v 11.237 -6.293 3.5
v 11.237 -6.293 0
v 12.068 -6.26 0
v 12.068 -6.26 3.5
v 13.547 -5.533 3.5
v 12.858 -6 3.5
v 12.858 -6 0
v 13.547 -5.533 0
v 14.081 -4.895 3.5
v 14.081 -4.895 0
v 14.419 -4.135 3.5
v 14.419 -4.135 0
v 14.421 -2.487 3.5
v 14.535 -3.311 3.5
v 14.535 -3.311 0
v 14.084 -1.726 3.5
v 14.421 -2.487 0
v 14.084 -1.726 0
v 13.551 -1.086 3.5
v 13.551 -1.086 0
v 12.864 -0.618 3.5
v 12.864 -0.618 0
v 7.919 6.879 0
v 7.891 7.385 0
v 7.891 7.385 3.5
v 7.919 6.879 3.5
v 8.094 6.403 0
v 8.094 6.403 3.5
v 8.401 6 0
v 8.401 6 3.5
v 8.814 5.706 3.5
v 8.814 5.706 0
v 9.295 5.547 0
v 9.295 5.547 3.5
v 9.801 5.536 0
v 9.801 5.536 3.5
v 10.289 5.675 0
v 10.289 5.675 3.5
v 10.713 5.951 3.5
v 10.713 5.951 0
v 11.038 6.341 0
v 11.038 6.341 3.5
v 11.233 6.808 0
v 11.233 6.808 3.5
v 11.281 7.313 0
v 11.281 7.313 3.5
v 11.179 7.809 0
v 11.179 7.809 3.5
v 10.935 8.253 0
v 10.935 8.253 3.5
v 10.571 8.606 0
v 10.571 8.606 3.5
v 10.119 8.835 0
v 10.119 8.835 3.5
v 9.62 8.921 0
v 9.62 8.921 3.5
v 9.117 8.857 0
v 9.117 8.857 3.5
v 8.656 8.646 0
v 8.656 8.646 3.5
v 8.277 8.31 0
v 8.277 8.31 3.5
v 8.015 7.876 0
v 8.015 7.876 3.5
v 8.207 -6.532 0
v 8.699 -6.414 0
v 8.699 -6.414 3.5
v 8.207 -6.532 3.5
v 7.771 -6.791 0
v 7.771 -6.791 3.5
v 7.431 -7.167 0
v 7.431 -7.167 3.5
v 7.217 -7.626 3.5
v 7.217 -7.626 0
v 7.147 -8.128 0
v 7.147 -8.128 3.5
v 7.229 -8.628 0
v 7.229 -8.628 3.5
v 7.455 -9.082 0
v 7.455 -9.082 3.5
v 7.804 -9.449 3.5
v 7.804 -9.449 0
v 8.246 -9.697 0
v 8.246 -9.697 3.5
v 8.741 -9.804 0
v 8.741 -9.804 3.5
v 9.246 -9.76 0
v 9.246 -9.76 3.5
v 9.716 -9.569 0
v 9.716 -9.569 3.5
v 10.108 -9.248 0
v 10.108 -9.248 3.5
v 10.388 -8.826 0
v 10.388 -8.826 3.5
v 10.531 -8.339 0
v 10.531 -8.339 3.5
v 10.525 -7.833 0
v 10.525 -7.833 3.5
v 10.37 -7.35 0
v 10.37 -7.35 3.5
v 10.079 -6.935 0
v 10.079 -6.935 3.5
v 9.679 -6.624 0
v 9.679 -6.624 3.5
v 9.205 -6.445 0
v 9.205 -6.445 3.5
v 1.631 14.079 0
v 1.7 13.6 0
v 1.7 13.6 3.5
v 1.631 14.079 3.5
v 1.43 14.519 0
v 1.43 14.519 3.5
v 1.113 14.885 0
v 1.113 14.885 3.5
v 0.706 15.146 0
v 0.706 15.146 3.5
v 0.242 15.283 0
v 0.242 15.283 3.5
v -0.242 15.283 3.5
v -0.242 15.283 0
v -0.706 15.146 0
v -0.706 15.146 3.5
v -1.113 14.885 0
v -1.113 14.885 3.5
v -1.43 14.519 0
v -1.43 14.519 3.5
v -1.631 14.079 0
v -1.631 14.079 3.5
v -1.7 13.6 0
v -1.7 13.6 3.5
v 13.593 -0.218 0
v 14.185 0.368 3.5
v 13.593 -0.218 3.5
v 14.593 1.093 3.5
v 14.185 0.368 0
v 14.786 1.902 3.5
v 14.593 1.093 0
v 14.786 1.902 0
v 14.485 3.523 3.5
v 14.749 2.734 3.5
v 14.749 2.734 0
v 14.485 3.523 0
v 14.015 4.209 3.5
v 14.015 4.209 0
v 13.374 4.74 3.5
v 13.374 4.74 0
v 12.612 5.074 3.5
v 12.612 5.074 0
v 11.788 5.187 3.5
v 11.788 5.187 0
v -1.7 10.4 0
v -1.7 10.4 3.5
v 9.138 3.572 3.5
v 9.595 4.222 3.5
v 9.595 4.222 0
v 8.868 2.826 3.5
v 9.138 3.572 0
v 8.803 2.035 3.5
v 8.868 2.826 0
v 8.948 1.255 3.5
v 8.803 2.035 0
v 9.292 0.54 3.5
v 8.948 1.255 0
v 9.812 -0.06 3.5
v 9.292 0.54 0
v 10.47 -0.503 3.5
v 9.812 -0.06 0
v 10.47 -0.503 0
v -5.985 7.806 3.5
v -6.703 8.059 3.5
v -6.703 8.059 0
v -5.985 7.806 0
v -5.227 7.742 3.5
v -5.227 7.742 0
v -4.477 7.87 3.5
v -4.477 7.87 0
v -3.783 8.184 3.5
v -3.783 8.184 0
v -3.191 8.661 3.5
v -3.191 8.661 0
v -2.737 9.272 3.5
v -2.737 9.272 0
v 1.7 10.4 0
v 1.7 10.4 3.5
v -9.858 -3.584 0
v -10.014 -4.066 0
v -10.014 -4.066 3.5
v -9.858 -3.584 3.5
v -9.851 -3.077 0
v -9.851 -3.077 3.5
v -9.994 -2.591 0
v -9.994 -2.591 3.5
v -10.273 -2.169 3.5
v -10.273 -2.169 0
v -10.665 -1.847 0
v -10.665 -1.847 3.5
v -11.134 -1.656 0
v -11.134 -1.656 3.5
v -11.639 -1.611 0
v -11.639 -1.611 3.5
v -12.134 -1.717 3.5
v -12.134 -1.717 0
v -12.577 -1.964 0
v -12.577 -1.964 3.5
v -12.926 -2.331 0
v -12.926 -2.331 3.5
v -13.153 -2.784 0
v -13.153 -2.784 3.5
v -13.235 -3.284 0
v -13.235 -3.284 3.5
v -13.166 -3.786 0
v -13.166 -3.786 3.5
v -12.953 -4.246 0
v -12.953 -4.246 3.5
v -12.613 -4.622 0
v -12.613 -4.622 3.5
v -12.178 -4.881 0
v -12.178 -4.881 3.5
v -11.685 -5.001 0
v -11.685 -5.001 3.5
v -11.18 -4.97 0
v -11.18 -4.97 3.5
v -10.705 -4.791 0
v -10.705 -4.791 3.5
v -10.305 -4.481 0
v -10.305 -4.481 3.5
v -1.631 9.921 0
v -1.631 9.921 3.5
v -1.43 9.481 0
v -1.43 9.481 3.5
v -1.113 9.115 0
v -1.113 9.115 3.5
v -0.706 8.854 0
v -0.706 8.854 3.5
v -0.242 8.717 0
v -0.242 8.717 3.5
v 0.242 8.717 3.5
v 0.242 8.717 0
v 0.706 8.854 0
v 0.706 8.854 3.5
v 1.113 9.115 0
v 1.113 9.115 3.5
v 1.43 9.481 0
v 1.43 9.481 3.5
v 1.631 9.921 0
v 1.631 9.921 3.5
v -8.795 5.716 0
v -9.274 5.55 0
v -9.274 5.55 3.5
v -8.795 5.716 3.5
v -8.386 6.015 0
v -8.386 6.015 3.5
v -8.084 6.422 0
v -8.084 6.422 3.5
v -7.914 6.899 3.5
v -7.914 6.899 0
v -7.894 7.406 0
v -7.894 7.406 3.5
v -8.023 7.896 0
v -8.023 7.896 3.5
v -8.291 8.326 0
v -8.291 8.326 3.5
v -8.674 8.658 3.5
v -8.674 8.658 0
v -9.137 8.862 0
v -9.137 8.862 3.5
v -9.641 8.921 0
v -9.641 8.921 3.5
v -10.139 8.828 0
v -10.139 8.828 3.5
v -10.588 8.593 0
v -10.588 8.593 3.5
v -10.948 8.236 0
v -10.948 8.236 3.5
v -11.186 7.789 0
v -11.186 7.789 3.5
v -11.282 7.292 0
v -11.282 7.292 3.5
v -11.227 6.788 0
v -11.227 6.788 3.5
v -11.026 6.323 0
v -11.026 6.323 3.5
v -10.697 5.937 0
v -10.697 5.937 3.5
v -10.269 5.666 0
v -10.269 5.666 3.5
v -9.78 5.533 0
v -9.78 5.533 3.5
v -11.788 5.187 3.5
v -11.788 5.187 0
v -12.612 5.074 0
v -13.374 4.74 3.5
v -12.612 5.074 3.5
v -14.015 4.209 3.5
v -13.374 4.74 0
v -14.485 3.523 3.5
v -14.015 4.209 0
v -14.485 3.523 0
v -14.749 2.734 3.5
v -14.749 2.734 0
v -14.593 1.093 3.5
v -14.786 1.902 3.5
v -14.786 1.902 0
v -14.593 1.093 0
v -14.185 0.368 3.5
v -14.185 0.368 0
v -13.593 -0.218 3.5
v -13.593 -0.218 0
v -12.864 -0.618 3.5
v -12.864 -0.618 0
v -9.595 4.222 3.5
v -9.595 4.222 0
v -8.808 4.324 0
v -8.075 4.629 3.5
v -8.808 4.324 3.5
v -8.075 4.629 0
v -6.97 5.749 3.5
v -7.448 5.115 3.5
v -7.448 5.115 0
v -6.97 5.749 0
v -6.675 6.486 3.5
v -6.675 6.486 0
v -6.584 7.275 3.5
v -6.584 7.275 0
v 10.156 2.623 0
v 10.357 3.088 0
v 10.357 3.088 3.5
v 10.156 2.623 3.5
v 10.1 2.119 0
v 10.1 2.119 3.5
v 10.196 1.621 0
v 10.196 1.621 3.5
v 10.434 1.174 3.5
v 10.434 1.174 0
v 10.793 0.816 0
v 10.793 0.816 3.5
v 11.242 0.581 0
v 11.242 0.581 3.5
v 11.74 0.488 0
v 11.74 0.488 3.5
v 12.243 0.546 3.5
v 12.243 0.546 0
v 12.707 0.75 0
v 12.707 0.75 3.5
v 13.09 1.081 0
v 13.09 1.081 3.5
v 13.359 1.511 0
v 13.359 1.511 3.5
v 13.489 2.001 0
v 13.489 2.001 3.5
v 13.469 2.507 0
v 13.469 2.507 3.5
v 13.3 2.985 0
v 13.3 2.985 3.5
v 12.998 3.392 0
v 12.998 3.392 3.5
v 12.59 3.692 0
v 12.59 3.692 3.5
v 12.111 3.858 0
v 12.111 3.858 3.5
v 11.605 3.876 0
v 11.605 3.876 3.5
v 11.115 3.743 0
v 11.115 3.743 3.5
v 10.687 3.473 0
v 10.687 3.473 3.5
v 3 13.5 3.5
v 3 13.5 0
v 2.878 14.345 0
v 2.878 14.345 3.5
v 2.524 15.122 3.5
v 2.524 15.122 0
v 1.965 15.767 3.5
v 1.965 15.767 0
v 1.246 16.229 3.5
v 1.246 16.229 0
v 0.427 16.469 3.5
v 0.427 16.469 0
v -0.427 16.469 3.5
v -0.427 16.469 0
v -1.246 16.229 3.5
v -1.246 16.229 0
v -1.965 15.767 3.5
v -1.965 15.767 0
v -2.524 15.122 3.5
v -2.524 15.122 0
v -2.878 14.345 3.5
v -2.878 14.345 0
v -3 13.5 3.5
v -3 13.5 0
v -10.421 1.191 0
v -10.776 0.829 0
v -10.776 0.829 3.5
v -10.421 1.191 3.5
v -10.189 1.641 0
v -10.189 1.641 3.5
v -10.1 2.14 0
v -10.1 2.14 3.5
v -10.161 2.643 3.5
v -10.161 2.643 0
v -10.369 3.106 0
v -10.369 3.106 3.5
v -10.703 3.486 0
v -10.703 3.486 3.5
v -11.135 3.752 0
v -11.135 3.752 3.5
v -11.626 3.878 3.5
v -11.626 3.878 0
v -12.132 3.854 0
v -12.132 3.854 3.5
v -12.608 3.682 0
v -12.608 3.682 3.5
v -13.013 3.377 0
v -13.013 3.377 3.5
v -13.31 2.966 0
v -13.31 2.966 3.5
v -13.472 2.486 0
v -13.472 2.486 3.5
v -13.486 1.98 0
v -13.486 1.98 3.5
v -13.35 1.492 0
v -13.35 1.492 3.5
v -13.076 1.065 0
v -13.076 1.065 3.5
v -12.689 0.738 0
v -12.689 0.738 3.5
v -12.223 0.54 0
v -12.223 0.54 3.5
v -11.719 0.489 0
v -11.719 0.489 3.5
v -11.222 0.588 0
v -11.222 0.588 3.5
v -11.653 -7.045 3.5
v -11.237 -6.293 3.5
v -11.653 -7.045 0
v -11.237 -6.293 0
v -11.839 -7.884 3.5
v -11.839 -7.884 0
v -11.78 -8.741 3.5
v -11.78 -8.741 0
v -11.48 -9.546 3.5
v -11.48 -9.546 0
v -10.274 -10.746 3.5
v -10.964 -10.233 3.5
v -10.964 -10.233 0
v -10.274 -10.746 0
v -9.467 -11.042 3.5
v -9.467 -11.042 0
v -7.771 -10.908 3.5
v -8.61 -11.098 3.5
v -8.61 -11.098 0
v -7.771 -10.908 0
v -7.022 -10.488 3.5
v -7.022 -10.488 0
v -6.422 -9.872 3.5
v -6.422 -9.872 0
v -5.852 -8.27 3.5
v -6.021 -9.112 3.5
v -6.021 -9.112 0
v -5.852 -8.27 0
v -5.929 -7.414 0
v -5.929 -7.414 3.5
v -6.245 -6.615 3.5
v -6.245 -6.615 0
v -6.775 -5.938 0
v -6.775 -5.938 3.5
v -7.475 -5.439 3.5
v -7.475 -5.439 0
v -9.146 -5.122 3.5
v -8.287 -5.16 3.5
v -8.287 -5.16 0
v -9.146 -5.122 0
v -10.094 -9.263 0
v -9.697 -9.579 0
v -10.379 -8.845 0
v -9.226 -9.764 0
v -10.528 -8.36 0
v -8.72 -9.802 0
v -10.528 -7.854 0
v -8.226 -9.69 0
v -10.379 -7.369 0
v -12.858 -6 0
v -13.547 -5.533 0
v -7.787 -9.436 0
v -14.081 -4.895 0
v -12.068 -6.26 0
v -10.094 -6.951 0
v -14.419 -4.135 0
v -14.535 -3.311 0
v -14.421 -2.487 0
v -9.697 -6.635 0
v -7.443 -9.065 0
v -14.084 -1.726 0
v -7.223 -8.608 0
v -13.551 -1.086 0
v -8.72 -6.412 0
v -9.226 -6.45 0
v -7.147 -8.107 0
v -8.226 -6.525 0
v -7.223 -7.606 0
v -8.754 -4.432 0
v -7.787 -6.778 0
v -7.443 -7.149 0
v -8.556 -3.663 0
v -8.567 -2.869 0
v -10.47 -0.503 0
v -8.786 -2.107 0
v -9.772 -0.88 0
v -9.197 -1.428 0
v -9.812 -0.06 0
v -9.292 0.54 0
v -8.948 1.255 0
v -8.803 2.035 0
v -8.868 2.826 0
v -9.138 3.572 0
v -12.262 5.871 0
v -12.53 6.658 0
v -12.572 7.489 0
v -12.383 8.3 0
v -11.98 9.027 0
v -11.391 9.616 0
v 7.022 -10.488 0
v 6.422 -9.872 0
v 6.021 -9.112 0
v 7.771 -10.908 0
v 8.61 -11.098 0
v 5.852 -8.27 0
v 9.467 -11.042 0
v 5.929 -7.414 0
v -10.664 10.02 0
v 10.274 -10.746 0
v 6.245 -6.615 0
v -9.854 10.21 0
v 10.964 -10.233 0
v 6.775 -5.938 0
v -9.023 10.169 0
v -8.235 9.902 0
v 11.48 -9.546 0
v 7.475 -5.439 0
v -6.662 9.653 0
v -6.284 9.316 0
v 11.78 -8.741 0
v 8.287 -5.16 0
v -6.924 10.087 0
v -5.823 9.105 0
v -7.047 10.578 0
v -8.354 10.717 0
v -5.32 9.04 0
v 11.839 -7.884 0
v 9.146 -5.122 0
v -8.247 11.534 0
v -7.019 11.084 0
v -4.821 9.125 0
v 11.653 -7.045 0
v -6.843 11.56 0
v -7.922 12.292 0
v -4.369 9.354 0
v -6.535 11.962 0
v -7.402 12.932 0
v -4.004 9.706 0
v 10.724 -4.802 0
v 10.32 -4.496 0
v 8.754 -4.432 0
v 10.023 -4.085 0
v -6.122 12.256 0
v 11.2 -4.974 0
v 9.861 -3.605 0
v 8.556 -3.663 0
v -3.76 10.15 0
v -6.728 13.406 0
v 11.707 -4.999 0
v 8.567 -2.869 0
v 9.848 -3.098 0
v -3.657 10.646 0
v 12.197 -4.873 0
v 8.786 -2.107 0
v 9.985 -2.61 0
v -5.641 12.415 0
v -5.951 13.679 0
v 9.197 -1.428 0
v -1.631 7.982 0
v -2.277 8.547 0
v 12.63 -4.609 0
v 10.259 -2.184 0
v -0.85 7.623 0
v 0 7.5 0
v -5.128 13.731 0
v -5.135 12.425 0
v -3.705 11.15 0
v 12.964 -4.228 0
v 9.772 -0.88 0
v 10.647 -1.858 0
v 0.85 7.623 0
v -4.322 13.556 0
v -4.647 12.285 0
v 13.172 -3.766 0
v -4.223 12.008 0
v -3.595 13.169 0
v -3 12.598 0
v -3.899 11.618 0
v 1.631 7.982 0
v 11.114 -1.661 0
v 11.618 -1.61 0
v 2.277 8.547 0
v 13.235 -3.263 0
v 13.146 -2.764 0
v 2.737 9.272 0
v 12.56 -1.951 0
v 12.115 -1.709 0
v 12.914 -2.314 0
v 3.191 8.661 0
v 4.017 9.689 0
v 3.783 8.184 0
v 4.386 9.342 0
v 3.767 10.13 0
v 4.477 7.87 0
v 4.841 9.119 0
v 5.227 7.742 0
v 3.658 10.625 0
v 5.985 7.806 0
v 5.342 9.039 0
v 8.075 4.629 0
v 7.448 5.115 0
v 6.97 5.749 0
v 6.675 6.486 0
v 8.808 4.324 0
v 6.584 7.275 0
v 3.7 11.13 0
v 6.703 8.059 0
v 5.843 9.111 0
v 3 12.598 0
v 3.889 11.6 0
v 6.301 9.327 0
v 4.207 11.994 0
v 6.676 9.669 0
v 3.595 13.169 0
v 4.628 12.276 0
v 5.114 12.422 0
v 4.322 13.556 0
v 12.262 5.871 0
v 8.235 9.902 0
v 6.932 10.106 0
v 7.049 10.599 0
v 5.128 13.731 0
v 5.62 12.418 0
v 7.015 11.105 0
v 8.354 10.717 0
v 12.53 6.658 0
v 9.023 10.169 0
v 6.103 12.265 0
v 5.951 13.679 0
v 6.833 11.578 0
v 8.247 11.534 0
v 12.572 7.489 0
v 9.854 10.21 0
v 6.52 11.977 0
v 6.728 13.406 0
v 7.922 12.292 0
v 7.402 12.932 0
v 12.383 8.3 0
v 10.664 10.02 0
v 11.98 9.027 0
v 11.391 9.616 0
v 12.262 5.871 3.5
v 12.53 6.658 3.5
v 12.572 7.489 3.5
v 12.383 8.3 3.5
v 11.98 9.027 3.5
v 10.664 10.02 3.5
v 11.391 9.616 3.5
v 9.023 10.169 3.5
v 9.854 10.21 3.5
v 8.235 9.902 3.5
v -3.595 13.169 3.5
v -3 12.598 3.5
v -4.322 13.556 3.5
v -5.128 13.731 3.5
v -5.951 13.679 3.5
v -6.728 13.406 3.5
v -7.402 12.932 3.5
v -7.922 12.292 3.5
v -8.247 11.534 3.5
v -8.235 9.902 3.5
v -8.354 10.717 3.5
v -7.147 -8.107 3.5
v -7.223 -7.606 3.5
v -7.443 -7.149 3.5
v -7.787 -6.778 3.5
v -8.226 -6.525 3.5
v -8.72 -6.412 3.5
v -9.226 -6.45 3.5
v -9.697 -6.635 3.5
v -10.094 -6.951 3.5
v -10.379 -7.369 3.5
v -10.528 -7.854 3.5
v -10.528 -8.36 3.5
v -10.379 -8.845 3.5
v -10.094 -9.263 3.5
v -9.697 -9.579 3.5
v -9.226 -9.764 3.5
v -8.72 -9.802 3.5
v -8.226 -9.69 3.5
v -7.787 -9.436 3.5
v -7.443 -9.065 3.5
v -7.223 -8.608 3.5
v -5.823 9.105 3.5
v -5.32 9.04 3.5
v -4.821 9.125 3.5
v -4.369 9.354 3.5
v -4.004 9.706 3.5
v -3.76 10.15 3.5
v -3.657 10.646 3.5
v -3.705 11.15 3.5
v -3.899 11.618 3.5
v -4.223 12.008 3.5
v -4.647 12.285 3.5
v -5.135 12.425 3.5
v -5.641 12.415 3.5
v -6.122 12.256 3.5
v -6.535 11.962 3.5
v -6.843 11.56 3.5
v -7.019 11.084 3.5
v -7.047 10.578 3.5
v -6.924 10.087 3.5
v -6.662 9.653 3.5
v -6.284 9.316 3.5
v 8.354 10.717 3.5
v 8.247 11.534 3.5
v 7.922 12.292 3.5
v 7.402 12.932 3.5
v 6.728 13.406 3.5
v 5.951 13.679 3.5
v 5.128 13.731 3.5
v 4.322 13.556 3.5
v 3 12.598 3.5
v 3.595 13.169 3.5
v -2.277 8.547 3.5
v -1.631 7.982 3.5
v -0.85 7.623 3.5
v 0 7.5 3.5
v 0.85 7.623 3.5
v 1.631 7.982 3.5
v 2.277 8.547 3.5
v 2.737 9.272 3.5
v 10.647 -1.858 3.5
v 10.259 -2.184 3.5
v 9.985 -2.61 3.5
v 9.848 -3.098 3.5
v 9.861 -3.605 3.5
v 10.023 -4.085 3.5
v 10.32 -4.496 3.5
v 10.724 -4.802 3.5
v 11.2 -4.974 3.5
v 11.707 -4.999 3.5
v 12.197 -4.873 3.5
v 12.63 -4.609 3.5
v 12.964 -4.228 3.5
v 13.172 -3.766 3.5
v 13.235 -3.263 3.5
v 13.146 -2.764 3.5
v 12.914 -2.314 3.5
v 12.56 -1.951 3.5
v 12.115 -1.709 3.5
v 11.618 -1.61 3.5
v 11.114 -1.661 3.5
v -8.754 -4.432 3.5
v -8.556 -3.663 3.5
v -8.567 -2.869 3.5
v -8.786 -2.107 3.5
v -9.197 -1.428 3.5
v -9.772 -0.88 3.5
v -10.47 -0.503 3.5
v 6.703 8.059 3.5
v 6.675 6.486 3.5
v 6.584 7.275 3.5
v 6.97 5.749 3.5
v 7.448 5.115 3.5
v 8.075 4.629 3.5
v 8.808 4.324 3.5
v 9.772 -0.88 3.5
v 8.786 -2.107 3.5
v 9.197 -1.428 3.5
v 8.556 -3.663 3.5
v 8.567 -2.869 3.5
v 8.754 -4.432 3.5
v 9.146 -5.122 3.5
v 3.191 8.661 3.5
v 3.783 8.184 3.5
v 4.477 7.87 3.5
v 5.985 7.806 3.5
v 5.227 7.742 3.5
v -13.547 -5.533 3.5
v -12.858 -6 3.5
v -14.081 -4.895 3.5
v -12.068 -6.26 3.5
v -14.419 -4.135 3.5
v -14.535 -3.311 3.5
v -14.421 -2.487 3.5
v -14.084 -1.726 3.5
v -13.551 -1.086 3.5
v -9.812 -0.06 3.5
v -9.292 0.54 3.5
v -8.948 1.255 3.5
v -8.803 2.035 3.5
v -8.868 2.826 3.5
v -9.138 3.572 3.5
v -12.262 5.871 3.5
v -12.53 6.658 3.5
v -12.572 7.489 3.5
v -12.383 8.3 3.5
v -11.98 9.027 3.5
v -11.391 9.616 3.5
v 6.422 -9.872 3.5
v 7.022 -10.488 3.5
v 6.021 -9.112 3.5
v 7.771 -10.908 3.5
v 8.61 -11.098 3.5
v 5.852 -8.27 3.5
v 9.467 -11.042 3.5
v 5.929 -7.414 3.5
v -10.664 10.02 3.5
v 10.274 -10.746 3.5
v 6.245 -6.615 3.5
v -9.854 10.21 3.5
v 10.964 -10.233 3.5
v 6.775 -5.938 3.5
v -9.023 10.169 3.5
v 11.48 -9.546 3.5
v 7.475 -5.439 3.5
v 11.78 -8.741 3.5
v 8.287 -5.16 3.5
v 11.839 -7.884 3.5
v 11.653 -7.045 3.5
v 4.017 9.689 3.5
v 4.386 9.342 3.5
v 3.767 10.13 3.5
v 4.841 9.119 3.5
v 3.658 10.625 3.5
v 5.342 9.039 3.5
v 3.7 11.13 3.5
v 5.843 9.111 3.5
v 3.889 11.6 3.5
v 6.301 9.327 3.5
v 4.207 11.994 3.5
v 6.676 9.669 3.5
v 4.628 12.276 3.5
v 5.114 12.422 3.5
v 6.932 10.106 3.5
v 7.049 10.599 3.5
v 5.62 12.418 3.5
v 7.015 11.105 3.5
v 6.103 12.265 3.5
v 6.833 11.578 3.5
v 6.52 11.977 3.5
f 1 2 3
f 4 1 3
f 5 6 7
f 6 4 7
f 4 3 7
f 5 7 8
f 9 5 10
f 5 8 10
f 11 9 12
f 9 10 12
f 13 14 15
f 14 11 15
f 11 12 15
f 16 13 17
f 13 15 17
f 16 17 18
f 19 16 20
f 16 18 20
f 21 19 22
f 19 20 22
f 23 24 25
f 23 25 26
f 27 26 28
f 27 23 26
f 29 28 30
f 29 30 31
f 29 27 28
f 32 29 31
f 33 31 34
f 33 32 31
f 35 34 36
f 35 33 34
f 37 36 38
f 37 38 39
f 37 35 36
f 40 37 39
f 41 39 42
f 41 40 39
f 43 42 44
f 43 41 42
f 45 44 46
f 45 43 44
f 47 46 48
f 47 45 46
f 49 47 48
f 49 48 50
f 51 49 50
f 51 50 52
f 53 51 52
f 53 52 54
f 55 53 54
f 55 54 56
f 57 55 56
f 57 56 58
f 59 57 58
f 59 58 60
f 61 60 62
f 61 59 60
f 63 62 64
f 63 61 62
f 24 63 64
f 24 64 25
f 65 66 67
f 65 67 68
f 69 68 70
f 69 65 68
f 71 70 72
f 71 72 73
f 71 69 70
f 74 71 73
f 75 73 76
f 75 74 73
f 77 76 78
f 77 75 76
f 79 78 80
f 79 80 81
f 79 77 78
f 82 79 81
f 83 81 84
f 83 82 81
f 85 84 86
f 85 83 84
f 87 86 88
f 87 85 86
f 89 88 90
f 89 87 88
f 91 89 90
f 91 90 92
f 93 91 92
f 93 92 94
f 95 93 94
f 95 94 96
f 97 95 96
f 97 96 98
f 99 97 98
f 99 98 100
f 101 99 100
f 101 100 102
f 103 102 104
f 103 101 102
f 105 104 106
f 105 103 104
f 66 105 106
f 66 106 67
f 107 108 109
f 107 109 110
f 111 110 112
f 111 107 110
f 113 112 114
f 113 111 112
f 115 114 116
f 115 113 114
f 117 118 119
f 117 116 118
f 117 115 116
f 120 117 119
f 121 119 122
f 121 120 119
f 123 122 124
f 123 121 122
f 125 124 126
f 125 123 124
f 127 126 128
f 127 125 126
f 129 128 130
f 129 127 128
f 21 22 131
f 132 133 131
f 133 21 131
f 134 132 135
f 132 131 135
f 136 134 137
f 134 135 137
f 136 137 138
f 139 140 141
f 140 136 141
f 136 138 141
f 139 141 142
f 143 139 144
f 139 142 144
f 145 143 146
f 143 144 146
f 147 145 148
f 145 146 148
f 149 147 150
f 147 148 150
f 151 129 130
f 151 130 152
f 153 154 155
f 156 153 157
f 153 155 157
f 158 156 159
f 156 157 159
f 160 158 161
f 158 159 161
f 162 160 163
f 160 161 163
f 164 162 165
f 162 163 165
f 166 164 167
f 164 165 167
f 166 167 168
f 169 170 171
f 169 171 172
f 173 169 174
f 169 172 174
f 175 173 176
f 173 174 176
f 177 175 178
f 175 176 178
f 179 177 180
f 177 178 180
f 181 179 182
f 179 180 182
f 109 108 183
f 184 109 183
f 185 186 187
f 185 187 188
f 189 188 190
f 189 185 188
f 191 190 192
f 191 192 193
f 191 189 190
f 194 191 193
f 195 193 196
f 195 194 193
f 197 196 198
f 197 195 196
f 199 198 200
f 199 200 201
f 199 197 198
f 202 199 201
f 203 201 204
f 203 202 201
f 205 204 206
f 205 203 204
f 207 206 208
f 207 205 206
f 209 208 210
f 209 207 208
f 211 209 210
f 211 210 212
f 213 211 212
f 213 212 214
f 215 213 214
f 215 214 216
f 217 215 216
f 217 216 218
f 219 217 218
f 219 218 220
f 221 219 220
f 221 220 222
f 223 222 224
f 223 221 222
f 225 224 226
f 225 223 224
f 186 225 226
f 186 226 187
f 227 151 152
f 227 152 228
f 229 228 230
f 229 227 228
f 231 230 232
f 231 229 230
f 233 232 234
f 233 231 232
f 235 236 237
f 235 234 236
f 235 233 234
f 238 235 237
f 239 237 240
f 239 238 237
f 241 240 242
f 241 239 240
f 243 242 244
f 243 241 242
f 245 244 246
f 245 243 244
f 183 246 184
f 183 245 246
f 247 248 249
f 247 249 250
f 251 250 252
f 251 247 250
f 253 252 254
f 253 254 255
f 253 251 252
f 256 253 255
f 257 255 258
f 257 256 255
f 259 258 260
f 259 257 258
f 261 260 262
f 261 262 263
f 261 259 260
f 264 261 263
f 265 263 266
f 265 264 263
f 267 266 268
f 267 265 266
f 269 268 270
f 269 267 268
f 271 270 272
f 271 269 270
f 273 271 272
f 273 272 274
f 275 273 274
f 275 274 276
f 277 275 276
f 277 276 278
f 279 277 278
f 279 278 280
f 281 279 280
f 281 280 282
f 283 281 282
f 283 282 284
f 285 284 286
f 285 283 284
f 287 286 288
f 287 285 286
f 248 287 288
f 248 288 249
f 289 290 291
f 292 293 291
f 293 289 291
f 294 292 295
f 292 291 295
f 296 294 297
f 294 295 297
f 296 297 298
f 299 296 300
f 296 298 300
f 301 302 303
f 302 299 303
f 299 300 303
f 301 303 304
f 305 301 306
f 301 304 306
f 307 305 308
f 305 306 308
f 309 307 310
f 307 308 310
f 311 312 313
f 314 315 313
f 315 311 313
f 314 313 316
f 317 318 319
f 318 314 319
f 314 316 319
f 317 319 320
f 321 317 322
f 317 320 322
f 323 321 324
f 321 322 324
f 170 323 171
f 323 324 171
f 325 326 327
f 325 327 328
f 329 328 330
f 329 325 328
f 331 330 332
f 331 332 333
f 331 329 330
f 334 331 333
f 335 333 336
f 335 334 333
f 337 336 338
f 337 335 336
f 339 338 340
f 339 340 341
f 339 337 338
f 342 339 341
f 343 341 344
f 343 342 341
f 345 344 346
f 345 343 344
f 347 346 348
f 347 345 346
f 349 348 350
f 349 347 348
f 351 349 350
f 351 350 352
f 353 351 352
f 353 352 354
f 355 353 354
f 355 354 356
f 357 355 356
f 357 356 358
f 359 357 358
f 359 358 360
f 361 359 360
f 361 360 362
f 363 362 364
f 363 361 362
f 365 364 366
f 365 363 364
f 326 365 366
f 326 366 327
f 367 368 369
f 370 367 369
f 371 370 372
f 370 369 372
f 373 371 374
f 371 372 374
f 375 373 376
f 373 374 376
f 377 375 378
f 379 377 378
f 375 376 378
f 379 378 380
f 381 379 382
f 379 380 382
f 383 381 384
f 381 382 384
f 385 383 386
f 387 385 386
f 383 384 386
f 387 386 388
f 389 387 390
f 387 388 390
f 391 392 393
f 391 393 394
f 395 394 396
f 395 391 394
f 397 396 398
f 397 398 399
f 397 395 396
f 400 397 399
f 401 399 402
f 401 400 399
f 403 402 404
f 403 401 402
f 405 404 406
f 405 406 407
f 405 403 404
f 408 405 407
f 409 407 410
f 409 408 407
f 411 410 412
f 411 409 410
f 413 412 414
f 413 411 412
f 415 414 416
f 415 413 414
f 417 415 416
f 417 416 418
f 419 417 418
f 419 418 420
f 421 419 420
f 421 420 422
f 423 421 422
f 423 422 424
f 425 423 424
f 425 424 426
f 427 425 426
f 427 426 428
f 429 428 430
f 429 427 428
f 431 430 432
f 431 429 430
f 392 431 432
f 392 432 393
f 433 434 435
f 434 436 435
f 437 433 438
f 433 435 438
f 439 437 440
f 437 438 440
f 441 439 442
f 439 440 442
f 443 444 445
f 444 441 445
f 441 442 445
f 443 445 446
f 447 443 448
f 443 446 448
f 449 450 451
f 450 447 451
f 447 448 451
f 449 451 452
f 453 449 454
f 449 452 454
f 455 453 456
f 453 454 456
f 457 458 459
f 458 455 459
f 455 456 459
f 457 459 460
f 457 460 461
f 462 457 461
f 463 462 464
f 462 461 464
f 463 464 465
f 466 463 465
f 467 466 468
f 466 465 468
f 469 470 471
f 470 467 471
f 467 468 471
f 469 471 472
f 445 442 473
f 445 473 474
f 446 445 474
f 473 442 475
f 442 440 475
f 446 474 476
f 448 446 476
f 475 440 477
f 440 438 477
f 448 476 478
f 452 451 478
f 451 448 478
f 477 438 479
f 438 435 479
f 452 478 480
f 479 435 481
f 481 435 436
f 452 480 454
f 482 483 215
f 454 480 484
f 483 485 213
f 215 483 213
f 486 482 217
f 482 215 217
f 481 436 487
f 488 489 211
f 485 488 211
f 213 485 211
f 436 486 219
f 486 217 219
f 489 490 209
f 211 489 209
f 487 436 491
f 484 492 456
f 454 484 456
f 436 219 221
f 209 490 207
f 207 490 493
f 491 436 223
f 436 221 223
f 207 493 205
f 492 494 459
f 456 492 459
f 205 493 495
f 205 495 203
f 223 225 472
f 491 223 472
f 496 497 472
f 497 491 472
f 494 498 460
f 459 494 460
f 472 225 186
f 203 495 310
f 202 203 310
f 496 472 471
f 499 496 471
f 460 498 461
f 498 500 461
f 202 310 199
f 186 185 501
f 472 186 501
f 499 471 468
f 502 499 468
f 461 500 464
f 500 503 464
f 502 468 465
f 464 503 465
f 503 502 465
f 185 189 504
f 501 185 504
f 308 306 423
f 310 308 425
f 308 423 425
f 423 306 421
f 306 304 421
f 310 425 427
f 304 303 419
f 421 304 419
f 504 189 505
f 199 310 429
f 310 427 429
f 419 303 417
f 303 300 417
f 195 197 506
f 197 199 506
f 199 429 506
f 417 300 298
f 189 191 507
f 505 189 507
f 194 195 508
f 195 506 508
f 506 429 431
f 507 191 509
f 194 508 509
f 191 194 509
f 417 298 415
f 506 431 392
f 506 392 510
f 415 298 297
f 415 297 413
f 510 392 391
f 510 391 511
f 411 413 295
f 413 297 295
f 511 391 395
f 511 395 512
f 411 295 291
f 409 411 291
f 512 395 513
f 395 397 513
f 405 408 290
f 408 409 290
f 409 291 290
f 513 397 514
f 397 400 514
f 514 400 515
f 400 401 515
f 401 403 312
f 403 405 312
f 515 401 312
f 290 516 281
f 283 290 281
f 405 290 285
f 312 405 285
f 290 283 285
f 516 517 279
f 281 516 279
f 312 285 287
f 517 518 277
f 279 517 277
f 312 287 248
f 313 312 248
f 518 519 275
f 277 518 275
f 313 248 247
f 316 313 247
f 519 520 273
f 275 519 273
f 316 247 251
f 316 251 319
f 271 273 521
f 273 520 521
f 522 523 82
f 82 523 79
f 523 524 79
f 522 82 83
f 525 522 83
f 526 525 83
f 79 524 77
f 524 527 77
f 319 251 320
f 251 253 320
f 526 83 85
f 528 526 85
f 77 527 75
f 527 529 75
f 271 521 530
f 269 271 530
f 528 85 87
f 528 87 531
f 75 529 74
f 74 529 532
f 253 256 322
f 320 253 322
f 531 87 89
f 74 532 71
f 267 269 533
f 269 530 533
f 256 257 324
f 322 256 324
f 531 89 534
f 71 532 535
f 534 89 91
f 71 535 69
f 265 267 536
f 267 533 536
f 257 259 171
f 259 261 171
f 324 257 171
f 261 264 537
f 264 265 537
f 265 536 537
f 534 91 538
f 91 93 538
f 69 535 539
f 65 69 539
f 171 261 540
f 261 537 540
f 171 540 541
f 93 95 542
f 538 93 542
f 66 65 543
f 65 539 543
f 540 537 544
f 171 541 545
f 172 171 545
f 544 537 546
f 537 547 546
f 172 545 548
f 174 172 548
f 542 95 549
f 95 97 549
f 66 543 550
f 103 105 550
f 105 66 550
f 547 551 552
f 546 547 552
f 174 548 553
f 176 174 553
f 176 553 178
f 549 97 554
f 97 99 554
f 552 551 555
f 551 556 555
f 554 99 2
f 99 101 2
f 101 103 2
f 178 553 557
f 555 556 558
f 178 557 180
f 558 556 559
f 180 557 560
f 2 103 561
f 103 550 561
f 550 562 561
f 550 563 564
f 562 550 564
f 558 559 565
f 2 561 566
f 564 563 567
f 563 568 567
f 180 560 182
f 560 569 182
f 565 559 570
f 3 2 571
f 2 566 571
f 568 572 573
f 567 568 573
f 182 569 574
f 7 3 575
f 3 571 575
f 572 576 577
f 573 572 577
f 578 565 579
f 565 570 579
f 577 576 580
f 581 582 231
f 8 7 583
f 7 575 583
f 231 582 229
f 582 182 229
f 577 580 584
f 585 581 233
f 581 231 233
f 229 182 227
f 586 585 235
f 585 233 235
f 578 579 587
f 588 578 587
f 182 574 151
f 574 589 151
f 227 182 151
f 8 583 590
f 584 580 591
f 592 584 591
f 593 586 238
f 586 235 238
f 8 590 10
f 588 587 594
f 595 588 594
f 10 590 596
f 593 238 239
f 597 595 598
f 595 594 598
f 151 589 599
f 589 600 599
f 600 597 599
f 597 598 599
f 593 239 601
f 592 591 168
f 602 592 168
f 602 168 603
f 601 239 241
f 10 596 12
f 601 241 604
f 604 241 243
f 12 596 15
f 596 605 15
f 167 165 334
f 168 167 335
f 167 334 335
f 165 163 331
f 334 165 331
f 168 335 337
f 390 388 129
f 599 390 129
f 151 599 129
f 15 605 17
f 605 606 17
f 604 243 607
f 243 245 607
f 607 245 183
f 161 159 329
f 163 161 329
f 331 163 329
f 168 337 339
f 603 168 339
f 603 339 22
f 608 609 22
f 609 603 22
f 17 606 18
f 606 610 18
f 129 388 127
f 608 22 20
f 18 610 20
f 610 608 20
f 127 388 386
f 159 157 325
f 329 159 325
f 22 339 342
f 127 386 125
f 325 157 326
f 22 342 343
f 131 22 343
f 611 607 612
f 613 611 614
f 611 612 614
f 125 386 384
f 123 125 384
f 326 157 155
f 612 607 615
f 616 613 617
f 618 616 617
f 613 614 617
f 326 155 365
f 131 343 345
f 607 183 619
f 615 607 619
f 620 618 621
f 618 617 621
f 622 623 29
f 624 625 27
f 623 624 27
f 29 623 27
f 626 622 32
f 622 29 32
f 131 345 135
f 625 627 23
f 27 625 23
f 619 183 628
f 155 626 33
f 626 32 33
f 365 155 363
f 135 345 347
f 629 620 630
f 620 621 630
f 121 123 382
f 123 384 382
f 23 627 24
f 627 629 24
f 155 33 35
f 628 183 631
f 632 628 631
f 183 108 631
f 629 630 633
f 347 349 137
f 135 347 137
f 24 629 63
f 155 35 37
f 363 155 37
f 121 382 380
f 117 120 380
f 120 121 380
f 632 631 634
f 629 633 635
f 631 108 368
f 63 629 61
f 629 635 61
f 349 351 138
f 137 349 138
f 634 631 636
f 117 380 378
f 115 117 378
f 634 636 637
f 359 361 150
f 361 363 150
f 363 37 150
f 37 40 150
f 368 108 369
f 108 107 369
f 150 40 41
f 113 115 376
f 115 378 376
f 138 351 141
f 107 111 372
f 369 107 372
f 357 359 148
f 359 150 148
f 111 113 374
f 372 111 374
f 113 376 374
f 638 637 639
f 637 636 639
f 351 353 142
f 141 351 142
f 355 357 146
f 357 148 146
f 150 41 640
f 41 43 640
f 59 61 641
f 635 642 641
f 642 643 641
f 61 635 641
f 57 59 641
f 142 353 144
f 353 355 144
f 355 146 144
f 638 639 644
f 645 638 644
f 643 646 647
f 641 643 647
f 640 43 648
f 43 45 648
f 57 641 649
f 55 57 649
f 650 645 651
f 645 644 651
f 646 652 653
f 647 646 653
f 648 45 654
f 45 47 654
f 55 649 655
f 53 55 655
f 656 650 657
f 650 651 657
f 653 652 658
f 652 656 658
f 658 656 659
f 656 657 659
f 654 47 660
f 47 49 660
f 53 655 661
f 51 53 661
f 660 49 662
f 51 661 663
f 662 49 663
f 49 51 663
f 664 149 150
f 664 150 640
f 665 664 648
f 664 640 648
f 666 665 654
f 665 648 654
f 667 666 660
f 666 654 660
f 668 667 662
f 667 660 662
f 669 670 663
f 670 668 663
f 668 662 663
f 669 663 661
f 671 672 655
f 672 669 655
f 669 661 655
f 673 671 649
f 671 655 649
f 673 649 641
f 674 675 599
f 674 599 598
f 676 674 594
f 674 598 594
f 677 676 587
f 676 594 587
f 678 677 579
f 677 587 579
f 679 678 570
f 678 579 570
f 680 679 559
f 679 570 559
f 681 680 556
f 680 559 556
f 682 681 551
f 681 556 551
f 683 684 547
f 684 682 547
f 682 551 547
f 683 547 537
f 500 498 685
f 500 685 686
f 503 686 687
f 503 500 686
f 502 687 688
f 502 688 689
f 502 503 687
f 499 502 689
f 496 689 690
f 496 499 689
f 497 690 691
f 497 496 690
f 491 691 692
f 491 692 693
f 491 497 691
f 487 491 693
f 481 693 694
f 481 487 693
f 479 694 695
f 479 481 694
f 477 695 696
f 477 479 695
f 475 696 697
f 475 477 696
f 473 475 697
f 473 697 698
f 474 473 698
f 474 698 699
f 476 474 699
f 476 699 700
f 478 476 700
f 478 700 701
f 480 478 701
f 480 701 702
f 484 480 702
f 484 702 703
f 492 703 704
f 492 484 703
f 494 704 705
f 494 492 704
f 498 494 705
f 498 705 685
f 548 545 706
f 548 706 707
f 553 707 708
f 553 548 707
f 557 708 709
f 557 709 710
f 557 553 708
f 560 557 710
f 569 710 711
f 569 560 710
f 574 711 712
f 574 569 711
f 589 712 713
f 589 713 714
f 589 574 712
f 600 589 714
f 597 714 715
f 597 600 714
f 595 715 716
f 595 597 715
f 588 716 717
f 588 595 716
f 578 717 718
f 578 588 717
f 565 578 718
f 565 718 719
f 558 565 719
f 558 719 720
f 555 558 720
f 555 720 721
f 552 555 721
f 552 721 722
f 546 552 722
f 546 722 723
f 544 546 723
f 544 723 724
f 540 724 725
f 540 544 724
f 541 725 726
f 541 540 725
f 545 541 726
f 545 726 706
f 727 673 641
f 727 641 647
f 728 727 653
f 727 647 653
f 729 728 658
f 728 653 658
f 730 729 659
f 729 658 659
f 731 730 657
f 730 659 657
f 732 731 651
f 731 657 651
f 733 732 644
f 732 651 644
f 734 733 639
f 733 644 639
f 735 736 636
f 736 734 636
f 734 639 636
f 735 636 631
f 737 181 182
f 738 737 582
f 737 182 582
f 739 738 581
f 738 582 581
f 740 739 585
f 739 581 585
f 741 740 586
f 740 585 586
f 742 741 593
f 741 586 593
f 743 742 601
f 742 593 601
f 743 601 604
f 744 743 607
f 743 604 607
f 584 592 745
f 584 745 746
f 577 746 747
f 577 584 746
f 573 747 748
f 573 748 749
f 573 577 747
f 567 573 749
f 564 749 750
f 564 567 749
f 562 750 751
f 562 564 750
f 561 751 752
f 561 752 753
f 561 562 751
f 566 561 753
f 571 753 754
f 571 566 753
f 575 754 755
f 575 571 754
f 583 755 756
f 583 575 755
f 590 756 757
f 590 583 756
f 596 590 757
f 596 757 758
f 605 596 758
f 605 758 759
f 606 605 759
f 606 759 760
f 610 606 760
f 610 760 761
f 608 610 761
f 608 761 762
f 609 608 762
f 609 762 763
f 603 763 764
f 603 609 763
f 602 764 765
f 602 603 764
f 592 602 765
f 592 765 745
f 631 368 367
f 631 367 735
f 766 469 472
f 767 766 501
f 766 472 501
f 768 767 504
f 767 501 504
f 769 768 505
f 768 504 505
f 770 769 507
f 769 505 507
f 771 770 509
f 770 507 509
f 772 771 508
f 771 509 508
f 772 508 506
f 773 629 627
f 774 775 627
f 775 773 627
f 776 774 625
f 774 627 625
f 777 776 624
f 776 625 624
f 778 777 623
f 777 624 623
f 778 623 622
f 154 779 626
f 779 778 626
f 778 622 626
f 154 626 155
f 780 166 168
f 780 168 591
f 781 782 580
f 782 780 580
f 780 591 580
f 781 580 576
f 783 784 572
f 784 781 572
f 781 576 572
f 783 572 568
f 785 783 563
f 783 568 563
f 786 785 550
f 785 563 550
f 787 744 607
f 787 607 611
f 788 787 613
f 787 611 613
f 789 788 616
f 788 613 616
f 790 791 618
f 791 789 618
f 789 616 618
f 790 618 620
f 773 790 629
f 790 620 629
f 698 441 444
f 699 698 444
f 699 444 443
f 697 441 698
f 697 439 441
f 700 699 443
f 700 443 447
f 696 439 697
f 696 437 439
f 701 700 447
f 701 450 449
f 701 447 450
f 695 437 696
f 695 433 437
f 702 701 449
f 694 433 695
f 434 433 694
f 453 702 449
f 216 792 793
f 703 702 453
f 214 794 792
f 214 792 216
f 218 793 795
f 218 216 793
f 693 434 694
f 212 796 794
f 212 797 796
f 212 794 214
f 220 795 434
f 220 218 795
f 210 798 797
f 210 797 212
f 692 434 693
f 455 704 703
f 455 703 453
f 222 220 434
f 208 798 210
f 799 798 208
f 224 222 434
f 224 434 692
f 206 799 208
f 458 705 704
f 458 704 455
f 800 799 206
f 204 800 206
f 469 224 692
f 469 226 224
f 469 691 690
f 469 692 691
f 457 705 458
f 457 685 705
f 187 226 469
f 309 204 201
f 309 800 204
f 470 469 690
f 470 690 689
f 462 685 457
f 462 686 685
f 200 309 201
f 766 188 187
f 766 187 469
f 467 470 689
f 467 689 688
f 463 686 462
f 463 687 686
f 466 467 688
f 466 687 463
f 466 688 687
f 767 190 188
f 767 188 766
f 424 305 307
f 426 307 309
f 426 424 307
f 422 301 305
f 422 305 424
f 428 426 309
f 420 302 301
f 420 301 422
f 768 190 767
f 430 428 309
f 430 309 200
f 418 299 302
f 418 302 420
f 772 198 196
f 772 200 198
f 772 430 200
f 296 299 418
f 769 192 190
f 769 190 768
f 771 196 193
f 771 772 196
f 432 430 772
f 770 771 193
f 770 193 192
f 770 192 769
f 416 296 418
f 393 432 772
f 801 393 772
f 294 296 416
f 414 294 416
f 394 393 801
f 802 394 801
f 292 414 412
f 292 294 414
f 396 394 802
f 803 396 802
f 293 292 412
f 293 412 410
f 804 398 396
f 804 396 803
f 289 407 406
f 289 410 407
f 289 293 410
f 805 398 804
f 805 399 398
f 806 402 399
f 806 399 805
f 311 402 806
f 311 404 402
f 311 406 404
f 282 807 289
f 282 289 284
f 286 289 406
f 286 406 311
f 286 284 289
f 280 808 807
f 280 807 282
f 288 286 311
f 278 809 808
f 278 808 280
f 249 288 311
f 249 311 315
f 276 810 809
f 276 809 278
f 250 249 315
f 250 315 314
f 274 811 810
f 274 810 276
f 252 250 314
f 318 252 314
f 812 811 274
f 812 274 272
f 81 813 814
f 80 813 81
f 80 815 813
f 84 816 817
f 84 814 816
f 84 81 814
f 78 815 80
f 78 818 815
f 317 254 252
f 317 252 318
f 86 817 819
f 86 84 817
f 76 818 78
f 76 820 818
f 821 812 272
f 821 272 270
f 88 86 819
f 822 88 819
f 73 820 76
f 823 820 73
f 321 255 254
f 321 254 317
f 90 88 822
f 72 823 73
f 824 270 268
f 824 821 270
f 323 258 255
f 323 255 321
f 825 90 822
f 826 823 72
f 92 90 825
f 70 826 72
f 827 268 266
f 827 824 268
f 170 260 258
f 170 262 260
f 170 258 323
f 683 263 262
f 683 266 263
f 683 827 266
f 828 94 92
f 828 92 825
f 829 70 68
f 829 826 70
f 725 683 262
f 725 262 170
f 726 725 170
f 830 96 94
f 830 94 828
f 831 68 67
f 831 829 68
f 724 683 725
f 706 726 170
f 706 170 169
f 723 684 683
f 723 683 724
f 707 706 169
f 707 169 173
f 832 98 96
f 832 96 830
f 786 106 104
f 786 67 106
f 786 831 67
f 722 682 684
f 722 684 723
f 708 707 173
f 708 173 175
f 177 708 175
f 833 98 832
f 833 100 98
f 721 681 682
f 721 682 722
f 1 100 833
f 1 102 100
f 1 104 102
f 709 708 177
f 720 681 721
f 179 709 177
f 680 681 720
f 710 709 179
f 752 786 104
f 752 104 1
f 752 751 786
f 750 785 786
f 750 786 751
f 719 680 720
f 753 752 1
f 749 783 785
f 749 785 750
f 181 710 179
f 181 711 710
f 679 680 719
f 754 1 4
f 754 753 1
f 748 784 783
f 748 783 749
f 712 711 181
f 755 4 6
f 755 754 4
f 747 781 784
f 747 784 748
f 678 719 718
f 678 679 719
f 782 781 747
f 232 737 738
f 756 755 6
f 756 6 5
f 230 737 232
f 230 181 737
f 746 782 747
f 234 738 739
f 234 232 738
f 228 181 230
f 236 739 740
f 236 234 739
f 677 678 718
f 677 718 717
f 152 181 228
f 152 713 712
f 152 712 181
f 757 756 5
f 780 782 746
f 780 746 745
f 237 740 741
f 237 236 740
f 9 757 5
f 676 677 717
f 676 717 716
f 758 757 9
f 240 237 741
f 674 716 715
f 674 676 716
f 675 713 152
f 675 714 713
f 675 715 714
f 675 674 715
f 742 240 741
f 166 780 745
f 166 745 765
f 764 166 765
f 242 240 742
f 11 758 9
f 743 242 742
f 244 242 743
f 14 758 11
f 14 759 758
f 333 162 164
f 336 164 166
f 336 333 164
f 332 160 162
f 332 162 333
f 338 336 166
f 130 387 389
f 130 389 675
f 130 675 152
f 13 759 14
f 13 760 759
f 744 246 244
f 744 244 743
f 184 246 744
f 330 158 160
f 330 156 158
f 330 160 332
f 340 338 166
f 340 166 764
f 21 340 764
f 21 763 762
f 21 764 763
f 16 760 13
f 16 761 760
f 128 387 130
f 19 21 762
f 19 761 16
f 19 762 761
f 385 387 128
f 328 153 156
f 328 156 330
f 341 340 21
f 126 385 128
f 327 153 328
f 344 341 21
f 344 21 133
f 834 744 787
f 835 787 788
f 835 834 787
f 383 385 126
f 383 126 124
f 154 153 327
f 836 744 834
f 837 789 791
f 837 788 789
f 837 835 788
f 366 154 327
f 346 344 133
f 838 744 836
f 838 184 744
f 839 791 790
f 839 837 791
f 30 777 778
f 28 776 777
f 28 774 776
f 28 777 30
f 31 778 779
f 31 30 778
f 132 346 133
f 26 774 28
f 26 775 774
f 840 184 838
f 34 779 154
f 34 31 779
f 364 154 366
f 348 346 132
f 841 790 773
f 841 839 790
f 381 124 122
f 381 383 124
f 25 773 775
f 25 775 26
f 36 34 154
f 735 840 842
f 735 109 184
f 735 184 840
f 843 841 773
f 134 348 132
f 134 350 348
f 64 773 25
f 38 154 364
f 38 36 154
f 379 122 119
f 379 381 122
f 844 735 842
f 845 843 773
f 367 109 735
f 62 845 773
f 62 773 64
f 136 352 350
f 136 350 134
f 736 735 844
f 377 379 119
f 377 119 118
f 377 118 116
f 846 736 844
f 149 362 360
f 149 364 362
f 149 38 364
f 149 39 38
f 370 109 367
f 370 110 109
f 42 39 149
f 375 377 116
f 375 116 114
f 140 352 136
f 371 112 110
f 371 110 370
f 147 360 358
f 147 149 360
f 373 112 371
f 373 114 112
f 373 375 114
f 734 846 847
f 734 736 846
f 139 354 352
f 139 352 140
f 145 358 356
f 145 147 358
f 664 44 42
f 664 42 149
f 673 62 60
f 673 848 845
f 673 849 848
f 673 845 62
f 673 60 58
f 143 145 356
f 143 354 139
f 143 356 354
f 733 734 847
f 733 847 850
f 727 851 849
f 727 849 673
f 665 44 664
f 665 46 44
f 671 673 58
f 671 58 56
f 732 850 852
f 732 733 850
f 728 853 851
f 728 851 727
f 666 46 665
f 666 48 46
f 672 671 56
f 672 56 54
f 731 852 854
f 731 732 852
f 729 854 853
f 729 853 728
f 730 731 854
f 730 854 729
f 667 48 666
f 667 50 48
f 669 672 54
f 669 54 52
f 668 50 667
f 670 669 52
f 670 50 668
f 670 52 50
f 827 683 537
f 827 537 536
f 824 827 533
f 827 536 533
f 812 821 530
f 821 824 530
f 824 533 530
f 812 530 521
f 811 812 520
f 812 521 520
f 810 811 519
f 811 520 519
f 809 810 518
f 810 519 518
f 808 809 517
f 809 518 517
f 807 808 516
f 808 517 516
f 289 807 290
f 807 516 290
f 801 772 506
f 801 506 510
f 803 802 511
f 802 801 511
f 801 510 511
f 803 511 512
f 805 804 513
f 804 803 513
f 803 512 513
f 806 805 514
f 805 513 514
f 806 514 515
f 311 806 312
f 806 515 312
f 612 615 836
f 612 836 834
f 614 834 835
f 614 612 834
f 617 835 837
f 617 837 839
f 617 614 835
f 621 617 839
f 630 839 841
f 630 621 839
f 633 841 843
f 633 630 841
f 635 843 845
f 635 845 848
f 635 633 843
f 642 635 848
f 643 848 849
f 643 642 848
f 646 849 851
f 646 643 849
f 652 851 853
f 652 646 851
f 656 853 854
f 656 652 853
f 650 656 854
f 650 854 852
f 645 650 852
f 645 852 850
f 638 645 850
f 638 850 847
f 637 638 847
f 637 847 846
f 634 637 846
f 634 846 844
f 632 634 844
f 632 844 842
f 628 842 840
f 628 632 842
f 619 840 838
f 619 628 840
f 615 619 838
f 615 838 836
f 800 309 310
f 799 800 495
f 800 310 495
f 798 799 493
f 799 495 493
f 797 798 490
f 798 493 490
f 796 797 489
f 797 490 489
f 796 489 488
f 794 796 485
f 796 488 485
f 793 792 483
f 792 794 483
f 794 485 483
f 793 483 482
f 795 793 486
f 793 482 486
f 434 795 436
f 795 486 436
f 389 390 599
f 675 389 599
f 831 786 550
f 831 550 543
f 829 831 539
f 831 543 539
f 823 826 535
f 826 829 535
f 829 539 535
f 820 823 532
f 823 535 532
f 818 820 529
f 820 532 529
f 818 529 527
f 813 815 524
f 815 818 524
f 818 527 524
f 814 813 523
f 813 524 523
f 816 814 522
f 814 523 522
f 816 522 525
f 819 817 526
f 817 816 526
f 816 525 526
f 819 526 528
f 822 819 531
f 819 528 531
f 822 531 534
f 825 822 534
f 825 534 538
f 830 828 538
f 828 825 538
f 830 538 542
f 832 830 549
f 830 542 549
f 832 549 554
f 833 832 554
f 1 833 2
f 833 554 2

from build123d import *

# Parameters (mm, degrees)
SKETCH_R           = 3
SKETCH_R_2         = 1.7
PAD_DEPTH          = 3.5
POLARPATTERN_COUNT = 11
POLARPATTERN_ANGLE = 265
PAD001_DEPTH       = 3.5
POCKET_DEPTH       = 0.001
POCKET_DEPTH_BACK  = -3.501


with BuildPart() as part:
    # Sketch → Pad (new body)
    with BuildSketch(Plane.XY):
        with Locations((-8.847328, -8.107082)):
            Circle(SKETCH_R)
        with Locations((-8.847328, -8.107082)):
            Circle(SKETCH_R_2, mode=Mode.SUBTRACT)
    pad = extrude(amount=PAD_DEPTH)

    # PolarPattern: Pad ×11 about axis
    polarpattern_axis = Axis((0, 0, 0), (0, 0, -1))
    for i in range(1, POLARPATTERN_COUNT):
        add(pad.rotate(polarpattern_axis, i * POLARPATTERN_ANGLE / (POLARPATTERN_COUNT - 1)))

    # Sketch001 → Pad001 (join)
    with BuildSketch(Plane.XY):
        with BuildLine():
            ThreePointArc((3, 13.5), (0, 16.5), (-3, 13.5))
            Line((-3, 13.5), (-3, 10.5))
            ThreePointArc((-3, 10.5), (0, 7.5), (3, 10.5))
            Line((3, 13.5), (3, 10.5))
        make_face()
    extrude(amount=PAD001_DEPTH)

    # Sketch002 → Pocket (cut, two sides)
    with BuildSketch(Plane.XY) as pocket_sk:
        with BuildLine():
            ThreePointArc((1.7, 13.6), (0, 15.3), (-1.7, 13.6))
            Line((-1.7, 13.6), (-1.7, 10.4))
            ThreePointArc((-1.7, 10.4), (0, 8.7), (1.7, 10.4))
            Line((1.7, 13.6), (1.7, 10.4))
        make_face()
    extrude(amount=-POCKET_DEPTH, mode=Mode.SUBTRACT)
    extrude(pocket_sk.sketch, amount=-POCKET_DEPTH_BACK, mode=Mode.SUBTRACT)


solid = part.part
